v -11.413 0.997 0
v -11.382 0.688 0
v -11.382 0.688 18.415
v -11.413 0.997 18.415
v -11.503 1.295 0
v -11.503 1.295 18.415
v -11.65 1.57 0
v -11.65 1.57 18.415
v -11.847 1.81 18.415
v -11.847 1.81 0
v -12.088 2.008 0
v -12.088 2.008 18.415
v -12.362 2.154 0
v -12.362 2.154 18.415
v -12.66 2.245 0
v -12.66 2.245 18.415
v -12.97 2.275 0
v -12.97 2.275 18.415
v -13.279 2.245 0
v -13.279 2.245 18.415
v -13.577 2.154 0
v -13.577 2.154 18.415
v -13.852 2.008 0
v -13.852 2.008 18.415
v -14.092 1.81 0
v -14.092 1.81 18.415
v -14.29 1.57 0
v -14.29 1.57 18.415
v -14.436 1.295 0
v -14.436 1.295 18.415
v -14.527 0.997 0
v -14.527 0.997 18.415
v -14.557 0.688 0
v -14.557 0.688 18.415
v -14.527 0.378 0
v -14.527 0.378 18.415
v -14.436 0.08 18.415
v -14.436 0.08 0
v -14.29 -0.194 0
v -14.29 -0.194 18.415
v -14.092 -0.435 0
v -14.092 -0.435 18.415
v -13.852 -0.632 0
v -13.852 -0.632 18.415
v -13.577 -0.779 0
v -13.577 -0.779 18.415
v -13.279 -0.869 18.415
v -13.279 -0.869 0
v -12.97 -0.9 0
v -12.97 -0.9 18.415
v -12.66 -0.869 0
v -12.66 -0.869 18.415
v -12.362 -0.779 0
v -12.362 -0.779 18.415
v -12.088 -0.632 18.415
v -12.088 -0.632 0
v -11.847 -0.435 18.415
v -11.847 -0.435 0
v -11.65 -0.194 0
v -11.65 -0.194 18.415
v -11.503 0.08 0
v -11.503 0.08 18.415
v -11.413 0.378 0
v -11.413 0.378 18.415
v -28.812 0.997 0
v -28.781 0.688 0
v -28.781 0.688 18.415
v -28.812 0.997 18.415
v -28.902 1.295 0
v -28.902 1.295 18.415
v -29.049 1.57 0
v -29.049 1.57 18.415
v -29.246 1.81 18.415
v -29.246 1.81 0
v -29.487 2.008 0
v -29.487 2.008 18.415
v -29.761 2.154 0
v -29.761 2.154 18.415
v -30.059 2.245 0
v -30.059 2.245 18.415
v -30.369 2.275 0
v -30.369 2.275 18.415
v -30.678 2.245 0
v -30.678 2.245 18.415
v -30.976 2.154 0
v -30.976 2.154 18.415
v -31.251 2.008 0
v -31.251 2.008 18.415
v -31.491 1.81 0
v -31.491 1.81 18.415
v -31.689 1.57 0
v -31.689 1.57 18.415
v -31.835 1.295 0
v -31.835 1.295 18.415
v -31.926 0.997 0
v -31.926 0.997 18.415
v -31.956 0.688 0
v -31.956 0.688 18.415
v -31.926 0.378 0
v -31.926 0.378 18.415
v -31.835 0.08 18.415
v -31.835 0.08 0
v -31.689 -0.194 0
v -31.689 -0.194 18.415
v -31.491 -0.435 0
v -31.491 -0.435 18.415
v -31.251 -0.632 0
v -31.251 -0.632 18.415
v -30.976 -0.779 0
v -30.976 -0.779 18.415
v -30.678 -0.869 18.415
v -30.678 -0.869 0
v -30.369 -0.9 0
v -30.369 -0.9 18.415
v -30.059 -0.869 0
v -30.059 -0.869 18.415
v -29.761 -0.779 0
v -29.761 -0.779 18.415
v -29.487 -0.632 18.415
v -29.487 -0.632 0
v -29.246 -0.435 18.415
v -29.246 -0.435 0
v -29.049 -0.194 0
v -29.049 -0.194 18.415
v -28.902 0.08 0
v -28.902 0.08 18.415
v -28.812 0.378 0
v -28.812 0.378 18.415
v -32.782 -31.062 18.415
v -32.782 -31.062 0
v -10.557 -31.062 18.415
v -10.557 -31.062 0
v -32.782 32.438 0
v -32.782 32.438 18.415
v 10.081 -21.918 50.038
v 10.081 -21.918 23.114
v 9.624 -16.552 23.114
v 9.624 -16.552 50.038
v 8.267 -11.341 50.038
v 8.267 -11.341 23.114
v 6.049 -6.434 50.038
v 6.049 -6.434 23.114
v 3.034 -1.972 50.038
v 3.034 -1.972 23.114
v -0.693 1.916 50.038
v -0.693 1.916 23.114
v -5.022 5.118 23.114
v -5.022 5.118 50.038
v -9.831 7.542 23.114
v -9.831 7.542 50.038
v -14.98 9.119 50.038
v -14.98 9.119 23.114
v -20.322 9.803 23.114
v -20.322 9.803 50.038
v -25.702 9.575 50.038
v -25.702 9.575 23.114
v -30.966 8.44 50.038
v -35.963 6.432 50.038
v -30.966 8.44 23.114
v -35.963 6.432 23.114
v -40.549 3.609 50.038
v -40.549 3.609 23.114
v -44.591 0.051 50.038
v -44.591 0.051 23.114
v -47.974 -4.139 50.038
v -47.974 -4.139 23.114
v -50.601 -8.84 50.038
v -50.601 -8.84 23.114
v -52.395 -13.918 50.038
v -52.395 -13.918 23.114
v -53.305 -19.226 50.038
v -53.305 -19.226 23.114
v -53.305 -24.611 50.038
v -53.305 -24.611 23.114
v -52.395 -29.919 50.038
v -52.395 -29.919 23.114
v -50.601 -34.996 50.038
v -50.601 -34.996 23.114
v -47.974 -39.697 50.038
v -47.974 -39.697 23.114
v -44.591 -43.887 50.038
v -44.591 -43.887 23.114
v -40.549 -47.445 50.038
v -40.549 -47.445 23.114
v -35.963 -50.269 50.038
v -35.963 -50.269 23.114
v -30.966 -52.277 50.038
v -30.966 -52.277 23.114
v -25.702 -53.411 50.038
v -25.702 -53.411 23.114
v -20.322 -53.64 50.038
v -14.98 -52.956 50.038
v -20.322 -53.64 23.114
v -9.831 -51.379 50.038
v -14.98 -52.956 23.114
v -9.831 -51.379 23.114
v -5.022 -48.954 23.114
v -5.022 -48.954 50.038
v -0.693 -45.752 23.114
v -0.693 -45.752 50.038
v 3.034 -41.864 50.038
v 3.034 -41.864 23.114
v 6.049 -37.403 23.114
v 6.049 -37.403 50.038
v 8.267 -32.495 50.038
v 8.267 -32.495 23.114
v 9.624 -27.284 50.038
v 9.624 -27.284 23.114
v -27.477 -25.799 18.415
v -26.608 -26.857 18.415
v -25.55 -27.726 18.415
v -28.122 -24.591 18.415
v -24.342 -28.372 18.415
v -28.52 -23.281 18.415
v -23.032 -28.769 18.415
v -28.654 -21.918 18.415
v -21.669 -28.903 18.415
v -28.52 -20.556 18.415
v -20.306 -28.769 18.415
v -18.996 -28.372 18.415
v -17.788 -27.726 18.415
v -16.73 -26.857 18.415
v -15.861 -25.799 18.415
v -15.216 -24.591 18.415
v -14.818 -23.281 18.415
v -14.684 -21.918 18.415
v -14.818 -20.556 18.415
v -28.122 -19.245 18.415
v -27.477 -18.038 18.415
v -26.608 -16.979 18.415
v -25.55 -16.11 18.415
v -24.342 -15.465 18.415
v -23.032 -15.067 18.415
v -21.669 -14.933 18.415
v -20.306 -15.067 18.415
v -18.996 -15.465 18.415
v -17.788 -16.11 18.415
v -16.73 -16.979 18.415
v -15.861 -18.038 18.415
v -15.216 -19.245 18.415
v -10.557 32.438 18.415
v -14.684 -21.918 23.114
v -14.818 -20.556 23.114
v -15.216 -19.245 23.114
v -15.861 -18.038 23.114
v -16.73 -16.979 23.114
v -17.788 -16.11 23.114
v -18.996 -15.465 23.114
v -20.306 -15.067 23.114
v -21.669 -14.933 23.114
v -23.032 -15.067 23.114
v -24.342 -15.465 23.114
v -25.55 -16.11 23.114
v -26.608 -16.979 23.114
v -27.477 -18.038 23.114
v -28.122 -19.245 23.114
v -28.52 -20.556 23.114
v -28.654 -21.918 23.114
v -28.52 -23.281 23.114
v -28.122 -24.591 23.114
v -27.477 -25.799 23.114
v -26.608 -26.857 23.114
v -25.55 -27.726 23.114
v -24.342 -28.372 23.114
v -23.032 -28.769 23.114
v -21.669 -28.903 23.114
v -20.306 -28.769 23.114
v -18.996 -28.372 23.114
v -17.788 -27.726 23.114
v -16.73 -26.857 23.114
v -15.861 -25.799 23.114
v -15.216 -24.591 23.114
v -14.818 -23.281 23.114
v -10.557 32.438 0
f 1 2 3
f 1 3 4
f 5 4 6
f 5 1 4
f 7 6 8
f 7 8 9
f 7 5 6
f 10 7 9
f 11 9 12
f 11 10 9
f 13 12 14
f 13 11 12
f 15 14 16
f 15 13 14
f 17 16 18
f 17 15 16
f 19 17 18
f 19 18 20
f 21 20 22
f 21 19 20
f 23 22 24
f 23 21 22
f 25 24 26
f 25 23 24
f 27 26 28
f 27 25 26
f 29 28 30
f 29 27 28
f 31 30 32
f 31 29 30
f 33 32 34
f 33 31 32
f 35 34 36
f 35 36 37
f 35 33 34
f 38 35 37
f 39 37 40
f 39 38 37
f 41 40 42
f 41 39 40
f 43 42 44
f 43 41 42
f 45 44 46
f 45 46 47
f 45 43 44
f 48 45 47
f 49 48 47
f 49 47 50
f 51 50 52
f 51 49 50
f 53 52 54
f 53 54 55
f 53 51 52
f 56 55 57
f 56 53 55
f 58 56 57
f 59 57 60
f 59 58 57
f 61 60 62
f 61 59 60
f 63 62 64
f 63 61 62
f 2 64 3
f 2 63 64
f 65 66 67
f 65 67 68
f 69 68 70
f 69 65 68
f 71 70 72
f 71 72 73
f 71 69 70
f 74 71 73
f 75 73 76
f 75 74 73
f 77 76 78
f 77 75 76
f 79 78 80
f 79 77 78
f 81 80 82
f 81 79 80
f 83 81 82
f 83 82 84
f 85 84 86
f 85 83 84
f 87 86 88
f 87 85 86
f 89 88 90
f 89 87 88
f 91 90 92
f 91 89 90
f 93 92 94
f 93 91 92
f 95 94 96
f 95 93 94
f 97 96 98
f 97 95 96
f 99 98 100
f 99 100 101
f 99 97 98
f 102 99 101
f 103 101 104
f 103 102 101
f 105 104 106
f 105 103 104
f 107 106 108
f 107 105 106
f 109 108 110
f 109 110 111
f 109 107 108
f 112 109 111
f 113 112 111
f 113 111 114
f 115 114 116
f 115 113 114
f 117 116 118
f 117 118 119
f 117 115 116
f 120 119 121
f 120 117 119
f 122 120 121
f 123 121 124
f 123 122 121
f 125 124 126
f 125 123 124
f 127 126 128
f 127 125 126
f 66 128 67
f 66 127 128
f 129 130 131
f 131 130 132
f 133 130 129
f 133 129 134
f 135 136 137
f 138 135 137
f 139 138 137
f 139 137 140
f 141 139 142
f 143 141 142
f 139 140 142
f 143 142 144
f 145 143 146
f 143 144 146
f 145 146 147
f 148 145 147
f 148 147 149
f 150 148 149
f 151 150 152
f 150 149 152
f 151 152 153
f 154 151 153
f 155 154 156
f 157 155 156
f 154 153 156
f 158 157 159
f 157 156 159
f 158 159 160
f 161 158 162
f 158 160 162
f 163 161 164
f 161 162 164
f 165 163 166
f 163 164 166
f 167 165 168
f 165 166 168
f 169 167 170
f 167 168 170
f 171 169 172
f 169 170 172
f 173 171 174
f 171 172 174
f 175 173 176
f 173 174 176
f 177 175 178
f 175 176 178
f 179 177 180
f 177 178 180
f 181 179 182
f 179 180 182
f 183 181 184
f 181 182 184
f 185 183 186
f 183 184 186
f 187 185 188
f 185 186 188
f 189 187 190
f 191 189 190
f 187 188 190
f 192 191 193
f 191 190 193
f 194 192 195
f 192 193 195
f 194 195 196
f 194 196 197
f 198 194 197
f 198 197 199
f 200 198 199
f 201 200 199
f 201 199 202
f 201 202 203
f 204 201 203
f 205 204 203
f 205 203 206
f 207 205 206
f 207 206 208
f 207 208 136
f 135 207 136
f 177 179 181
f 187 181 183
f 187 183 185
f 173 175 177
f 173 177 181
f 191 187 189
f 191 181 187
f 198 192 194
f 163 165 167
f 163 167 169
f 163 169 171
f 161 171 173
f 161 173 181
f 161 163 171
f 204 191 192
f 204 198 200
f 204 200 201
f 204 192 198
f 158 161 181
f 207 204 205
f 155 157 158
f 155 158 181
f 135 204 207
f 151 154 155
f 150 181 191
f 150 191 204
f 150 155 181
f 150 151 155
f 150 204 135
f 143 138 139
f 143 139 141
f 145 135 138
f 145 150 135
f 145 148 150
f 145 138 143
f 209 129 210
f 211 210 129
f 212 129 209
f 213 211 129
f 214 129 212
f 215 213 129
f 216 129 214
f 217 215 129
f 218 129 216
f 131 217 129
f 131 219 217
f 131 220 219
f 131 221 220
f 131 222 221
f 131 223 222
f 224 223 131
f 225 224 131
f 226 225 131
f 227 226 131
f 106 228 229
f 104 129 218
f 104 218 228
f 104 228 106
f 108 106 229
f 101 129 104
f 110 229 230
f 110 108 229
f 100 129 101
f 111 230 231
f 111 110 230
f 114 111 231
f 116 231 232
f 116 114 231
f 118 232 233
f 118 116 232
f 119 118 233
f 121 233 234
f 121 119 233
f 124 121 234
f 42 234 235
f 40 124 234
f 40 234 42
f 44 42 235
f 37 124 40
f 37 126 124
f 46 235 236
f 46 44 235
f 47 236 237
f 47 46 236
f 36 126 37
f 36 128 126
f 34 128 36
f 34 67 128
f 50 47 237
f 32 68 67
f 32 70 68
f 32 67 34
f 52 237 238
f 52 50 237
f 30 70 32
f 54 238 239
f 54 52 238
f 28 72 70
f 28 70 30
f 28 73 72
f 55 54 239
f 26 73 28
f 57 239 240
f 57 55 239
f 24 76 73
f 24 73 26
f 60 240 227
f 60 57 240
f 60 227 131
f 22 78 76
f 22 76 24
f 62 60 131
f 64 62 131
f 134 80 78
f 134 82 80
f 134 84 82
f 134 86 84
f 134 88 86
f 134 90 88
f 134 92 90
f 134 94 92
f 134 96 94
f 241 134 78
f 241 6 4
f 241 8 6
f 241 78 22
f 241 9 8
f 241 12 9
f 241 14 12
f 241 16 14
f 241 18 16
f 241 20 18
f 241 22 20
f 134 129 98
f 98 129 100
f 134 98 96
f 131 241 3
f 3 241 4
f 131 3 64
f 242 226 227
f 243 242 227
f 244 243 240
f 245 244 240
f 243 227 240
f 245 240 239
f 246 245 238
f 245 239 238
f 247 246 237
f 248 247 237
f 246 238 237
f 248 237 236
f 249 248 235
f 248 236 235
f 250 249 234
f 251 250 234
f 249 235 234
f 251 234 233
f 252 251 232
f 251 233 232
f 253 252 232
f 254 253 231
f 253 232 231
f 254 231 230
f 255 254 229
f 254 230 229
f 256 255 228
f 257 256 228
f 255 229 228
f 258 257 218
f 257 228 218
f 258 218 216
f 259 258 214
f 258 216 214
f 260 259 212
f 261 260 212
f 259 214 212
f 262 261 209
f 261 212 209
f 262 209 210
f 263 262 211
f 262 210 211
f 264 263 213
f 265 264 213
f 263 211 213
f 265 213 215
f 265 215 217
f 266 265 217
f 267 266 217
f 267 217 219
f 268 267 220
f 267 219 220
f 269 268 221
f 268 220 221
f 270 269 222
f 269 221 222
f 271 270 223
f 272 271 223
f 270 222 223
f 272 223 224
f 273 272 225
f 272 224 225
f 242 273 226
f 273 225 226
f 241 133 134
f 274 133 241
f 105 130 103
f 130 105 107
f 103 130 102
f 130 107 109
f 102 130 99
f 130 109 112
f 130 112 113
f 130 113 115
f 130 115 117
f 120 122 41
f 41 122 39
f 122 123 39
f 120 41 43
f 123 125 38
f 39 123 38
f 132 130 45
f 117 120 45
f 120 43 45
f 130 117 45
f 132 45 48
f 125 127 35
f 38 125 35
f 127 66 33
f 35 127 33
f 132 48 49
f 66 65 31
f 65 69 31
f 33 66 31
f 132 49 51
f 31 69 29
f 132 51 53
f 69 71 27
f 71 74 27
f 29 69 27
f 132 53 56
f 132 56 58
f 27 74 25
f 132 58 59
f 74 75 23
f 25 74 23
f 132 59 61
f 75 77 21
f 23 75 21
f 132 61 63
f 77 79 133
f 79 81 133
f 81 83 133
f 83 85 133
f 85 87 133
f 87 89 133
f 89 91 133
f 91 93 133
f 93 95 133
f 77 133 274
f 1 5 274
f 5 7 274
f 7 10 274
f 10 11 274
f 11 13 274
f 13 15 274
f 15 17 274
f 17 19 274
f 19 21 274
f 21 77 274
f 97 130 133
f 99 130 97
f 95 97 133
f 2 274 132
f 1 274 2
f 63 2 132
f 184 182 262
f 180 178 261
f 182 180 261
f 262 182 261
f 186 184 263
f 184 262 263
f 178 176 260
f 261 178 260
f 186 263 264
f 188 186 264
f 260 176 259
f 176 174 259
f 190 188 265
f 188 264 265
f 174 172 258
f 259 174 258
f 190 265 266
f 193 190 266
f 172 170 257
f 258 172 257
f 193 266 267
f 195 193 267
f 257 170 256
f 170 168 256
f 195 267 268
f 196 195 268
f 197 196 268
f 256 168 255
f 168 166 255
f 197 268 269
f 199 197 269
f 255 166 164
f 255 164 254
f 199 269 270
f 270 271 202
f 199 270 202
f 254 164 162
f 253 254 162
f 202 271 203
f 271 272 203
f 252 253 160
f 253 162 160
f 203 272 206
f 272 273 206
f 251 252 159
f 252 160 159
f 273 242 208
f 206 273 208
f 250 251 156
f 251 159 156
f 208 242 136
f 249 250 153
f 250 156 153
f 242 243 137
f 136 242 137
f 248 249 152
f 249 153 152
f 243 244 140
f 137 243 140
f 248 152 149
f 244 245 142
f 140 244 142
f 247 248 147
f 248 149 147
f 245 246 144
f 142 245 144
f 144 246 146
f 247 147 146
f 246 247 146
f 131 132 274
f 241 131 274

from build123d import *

# Parameters (mm, degrees)
SKETCH1_W           = 22.225
SKETCH1_H           = 63.5
SKETCH1_R           = 1.5875
BOSS_EXTRUDE1_DEPTH = 18.415
SKETCH2_R           = 6.985
BOSS_EXTRUDE2_DEPTH = 4.699
SKETCH3_R           = 31.75
BOSS_EXTRUDE3_DEPTH = 26.924


with BuildPart() as part:
    # Sketch1 → Boss-Extrude1 (new body)
    with BuildSketch(Plane.XY):
        with Locations((-21.669088448, 0.687725632)):
            Rectangle(SKETCH1_W, SKETCH1_H)
        with Locations((-30.368588448, 0.687725632)):
            Circle(SKETCH1_R, mode=Mode.SUBTRACT)
        with Locations((-12.969588448, 0.687725632)):
            Circle(SKETCH1_R, mode=Mode.SUBTRACT)
    extrude(amount=BOSS_EXTRUDE1_DEPTH)

    # Sketch2 → Boss-Extrude2 (add)
    with BuildSketch(Plane.XY.offset(18.415)):
        with Locations((-21.669088448, -21.918274368)):
            Circle(SKETCH2_R)
    extrude(amount=BOSS_EXTRUDE2_DEPTH)

    # Sketch3 → Boss-Extrude3 (add)
    with BuildSketch(Plane.XY.offset(23.114)):
        with Locations((-21.669088448, -21.918274368)):
            Circle(SKETCH3_R)
    extrude(amount=BOSS_EXTRUDE3_DEPTH)


solid = part.part
